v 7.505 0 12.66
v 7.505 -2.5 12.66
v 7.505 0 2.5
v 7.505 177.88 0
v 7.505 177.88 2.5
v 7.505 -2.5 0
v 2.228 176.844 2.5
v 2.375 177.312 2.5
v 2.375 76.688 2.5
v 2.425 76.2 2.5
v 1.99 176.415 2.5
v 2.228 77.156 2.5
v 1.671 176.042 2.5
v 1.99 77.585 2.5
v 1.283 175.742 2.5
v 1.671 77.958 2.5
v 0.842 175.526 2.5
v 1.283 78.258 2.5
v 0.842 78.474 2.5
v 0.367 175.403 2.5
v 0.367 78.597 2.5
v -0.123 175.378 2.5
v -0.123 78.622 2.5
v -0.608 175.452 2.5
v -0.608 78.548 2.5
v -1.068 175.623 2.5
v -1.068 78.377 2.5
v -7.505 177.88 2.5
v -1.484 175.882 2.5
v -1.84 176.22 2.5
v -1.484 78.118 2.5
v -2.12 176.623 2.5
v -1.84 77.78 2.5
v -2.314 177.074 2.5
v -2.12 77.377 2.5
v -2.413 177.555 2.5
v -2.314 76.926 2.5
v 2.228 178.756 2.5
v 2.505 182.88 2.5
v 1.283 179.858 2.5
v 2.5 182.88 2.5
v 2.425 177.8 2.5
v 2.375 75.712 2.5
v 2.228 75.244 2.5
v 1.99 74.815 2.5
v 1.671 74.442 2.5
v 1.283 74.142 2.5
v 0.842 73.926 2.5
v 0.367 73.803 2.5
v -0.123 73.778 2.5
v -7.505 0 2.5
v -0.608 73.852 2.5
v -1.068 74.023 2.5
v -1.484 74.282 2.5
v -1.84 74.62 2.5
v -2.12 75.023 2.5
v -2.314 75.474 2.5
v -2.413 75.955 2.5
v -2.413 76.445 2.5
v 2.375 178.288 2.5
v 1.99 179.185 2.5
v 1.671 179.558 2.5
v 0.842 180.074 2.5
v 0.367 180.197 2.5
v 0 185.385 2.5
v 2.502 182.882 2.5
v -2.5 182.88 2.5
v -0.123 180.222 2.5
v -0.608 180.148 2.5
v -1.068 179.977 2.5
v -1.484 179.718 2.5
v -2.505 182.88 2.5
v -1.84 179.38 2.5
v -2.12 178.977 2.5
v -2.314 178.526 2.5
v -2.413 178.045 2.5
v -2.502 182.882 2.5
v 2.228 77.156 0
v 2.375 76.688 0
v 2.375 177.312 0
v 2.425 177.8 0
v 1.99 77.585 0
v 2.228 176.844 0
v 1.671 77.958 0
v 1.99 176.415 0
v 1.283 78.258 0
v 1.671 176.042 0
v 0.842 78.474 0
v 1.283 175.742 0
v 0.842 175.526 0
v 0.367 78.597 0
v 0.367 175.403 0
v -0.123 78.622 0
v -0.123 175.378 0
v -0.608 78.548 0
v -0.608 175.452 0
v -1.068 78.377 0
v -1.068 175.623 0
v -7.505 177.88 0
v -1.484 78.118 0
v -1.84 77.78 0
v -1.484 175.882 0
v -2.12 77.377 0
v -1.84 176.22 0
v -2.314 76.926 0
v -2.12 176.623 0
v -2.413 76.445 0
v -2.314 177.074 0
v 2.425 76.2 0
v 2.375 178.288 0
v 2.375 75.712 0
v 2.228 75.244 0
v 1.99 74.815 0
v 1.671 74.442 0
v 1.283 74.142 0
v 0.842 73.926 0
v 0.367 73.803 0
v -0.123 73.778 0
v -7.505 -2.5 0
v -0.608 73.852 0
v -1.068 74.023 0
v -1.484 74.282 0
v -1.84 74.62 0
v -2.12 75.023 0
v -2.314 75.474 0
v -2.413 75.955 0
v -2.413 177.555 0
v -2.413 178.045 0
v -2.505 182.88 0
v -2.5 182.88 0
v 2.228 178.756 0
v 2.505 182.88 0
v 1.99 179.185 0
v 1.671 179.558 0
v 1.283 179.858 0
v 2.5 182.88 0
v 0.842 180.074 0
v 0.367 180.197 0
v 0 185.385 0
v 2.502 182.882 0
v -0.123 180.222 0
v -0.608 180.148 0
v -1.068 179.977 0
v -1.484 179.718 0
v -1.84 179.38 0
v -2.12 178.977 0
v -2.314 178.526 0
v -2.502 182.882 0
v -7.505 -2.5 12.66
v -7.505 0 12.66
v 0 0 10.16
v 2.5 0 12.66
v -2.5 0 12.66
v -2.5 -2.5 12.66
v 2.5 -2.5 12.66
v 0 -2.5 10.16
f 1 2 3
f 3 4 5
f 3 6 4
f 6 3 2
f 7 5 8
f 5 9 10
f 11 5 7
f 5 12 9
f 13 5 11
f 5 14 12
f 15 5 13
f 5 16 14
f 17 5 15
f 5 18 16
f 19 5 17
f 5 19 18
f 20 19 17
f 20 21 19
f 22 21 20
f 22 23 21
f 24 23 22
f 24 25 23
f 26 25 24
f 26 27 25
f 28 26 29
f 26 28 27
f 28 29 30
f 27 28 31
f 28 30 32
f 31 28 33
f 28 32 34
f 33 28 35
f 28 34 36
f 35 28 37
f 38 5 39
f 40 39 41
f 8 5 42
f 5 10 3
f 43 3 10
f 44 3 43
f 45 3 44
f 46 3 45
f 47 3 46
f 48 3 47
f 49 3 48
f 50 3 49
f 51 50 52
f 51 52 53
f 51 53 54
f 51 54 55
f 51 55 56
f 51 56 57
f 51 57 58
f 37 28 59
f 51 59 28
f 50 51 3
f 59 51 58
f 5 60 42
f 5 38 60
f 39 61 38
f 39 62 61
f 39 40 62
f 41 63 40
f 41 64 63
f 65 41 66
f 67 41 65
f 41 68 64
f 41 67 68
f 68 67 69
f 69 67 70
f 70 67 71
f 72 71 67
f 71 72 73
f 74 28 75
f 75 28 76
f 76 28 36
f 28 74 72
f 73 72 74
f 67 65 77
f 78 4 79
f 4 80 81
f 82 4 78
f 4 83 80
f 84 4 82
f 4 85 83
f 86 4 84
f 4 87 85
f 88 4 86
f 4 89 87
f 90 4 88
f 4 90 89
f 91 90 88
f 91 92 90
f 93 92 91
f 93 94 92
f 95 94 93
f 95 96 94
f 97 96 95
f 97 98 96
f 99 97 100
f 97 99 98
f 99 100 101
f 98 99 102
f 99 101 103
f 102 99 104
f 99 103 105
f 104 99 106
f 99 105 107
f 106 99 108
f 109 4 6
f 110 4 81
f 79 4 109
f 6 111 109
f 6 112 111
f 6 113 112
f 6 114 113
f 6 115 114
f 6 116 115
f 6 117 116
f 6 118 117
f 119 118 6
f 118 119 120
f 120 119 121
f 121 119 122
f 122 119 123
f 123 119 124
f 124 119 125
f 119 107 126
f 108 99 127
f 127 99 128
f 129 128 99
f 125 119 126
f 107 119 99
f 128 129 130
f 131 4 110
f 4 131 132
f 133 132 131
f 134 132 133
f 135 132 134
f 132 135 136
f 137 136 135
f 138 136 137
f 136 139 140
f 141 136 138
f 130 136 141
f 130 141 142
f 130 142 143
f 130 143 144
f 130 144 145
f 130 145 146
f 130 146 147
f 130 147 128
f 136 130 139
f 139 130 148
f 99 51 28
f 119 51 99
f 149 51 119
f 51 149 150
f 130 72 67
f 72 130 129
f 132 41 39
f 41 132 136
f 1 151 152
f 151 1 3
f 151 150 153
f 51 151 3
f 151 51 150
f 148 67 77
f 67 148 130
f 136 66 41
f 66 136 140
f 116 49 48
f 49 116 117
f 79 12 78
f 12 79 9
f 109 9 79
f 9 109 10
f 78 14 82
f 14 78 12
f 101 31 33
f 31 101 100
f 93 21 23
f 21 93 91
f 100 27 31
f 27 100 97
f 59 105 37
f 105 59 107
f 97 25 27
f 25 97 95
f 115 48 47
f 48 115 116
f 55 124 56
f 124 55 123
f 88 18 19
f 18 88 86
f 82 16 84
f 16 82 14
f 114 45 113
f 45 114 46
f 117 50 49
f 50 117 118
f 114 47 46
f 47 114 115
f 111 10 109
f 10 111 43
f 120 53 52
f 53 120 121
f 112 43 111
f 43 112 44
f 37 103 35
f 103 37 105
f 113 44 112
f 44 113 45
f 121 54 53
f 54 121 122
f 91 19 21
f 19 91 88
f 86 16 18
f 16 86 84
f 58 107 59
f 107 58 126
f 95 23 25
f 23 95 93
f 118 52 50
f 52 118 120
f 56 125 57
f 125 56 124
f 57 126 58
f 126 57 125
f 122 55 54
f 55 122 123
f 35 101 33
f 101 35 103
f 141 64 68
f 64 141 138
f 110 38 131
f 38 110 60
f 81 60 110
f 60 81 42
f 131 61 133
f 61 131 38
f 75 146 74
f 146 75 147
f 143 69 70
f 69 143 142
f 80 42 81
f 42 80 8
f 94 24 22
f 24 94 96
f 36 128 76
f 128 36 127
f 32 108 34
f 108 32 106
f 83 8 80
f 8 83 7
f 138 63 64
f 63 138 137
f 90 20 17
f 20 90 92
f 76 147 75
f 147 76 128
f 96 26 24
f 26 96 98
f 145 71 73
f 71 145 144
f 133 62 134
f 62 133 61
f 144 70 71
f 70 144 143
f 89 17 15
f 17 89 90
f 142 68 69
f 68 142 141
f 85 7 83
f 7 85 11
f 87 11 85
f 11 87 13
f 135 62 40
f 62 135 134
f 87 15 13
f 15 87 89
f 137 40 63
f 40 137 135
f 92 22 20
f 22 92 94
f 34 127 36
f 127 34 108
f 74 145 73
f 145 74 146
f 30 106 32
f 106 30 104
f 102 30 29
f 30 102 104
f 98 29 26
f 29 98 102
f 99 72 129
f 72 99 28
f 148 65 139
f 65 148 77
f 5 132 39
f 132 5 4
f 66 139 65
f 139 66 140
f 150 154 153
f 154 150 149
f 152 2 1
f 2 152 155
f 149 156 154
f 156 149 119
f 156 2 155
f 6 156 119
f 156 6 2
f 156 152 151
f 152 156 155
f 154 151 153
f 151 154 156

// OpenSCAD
$fa=0.5; // default minimum facet angle
$fs=0.5; // default minimum facet size

inch = 25.4;

hole_dist = 4 * inch;
border_dist = 3 * inch;
hole_d = 4.85;

lag = 0.2 * inch;
d = 0.4 * inch;
thickness = 2.5;
notch = 4;

w = 2 * lag + hole_d;
h = hole_dist + border_dist + lag;

union() {
    difference() {
        union() {
            translate([-w/2, 0, 0]) cube([w, h, thickness]);
            translate([0, h-thickness, 0]) rotate([0, 0, 45]) cube([notch, notch, thickness]);
        }
        translate([0, border_dist, -1]) cylinder(d=hole_d, h=thickness+2);
        translate([0, border_dist + hole_dist, -1]) rotate([0, 0, 0]) cylinder(d=hole_d, h=thickness+2);
        translate([-w/2, h-2*thickness, -1]) rotate([0, 0, 45]) cube([w, w, thickness+2]);
        translate([ w/2, h-2*thickness, -1]) rotate([0, 0, 45]) cube([w, w, thickness+2]);
    }
    difference() {
        translate([-w/2, -thickness, 0]) cube([w, thickness, d + thickness]);
        translate([0, 0, d]) rotate([0, -45, 0]) translate([0, -thickness-1, 0]) cube([notch, thickness + 2, notch]);
    }
}
